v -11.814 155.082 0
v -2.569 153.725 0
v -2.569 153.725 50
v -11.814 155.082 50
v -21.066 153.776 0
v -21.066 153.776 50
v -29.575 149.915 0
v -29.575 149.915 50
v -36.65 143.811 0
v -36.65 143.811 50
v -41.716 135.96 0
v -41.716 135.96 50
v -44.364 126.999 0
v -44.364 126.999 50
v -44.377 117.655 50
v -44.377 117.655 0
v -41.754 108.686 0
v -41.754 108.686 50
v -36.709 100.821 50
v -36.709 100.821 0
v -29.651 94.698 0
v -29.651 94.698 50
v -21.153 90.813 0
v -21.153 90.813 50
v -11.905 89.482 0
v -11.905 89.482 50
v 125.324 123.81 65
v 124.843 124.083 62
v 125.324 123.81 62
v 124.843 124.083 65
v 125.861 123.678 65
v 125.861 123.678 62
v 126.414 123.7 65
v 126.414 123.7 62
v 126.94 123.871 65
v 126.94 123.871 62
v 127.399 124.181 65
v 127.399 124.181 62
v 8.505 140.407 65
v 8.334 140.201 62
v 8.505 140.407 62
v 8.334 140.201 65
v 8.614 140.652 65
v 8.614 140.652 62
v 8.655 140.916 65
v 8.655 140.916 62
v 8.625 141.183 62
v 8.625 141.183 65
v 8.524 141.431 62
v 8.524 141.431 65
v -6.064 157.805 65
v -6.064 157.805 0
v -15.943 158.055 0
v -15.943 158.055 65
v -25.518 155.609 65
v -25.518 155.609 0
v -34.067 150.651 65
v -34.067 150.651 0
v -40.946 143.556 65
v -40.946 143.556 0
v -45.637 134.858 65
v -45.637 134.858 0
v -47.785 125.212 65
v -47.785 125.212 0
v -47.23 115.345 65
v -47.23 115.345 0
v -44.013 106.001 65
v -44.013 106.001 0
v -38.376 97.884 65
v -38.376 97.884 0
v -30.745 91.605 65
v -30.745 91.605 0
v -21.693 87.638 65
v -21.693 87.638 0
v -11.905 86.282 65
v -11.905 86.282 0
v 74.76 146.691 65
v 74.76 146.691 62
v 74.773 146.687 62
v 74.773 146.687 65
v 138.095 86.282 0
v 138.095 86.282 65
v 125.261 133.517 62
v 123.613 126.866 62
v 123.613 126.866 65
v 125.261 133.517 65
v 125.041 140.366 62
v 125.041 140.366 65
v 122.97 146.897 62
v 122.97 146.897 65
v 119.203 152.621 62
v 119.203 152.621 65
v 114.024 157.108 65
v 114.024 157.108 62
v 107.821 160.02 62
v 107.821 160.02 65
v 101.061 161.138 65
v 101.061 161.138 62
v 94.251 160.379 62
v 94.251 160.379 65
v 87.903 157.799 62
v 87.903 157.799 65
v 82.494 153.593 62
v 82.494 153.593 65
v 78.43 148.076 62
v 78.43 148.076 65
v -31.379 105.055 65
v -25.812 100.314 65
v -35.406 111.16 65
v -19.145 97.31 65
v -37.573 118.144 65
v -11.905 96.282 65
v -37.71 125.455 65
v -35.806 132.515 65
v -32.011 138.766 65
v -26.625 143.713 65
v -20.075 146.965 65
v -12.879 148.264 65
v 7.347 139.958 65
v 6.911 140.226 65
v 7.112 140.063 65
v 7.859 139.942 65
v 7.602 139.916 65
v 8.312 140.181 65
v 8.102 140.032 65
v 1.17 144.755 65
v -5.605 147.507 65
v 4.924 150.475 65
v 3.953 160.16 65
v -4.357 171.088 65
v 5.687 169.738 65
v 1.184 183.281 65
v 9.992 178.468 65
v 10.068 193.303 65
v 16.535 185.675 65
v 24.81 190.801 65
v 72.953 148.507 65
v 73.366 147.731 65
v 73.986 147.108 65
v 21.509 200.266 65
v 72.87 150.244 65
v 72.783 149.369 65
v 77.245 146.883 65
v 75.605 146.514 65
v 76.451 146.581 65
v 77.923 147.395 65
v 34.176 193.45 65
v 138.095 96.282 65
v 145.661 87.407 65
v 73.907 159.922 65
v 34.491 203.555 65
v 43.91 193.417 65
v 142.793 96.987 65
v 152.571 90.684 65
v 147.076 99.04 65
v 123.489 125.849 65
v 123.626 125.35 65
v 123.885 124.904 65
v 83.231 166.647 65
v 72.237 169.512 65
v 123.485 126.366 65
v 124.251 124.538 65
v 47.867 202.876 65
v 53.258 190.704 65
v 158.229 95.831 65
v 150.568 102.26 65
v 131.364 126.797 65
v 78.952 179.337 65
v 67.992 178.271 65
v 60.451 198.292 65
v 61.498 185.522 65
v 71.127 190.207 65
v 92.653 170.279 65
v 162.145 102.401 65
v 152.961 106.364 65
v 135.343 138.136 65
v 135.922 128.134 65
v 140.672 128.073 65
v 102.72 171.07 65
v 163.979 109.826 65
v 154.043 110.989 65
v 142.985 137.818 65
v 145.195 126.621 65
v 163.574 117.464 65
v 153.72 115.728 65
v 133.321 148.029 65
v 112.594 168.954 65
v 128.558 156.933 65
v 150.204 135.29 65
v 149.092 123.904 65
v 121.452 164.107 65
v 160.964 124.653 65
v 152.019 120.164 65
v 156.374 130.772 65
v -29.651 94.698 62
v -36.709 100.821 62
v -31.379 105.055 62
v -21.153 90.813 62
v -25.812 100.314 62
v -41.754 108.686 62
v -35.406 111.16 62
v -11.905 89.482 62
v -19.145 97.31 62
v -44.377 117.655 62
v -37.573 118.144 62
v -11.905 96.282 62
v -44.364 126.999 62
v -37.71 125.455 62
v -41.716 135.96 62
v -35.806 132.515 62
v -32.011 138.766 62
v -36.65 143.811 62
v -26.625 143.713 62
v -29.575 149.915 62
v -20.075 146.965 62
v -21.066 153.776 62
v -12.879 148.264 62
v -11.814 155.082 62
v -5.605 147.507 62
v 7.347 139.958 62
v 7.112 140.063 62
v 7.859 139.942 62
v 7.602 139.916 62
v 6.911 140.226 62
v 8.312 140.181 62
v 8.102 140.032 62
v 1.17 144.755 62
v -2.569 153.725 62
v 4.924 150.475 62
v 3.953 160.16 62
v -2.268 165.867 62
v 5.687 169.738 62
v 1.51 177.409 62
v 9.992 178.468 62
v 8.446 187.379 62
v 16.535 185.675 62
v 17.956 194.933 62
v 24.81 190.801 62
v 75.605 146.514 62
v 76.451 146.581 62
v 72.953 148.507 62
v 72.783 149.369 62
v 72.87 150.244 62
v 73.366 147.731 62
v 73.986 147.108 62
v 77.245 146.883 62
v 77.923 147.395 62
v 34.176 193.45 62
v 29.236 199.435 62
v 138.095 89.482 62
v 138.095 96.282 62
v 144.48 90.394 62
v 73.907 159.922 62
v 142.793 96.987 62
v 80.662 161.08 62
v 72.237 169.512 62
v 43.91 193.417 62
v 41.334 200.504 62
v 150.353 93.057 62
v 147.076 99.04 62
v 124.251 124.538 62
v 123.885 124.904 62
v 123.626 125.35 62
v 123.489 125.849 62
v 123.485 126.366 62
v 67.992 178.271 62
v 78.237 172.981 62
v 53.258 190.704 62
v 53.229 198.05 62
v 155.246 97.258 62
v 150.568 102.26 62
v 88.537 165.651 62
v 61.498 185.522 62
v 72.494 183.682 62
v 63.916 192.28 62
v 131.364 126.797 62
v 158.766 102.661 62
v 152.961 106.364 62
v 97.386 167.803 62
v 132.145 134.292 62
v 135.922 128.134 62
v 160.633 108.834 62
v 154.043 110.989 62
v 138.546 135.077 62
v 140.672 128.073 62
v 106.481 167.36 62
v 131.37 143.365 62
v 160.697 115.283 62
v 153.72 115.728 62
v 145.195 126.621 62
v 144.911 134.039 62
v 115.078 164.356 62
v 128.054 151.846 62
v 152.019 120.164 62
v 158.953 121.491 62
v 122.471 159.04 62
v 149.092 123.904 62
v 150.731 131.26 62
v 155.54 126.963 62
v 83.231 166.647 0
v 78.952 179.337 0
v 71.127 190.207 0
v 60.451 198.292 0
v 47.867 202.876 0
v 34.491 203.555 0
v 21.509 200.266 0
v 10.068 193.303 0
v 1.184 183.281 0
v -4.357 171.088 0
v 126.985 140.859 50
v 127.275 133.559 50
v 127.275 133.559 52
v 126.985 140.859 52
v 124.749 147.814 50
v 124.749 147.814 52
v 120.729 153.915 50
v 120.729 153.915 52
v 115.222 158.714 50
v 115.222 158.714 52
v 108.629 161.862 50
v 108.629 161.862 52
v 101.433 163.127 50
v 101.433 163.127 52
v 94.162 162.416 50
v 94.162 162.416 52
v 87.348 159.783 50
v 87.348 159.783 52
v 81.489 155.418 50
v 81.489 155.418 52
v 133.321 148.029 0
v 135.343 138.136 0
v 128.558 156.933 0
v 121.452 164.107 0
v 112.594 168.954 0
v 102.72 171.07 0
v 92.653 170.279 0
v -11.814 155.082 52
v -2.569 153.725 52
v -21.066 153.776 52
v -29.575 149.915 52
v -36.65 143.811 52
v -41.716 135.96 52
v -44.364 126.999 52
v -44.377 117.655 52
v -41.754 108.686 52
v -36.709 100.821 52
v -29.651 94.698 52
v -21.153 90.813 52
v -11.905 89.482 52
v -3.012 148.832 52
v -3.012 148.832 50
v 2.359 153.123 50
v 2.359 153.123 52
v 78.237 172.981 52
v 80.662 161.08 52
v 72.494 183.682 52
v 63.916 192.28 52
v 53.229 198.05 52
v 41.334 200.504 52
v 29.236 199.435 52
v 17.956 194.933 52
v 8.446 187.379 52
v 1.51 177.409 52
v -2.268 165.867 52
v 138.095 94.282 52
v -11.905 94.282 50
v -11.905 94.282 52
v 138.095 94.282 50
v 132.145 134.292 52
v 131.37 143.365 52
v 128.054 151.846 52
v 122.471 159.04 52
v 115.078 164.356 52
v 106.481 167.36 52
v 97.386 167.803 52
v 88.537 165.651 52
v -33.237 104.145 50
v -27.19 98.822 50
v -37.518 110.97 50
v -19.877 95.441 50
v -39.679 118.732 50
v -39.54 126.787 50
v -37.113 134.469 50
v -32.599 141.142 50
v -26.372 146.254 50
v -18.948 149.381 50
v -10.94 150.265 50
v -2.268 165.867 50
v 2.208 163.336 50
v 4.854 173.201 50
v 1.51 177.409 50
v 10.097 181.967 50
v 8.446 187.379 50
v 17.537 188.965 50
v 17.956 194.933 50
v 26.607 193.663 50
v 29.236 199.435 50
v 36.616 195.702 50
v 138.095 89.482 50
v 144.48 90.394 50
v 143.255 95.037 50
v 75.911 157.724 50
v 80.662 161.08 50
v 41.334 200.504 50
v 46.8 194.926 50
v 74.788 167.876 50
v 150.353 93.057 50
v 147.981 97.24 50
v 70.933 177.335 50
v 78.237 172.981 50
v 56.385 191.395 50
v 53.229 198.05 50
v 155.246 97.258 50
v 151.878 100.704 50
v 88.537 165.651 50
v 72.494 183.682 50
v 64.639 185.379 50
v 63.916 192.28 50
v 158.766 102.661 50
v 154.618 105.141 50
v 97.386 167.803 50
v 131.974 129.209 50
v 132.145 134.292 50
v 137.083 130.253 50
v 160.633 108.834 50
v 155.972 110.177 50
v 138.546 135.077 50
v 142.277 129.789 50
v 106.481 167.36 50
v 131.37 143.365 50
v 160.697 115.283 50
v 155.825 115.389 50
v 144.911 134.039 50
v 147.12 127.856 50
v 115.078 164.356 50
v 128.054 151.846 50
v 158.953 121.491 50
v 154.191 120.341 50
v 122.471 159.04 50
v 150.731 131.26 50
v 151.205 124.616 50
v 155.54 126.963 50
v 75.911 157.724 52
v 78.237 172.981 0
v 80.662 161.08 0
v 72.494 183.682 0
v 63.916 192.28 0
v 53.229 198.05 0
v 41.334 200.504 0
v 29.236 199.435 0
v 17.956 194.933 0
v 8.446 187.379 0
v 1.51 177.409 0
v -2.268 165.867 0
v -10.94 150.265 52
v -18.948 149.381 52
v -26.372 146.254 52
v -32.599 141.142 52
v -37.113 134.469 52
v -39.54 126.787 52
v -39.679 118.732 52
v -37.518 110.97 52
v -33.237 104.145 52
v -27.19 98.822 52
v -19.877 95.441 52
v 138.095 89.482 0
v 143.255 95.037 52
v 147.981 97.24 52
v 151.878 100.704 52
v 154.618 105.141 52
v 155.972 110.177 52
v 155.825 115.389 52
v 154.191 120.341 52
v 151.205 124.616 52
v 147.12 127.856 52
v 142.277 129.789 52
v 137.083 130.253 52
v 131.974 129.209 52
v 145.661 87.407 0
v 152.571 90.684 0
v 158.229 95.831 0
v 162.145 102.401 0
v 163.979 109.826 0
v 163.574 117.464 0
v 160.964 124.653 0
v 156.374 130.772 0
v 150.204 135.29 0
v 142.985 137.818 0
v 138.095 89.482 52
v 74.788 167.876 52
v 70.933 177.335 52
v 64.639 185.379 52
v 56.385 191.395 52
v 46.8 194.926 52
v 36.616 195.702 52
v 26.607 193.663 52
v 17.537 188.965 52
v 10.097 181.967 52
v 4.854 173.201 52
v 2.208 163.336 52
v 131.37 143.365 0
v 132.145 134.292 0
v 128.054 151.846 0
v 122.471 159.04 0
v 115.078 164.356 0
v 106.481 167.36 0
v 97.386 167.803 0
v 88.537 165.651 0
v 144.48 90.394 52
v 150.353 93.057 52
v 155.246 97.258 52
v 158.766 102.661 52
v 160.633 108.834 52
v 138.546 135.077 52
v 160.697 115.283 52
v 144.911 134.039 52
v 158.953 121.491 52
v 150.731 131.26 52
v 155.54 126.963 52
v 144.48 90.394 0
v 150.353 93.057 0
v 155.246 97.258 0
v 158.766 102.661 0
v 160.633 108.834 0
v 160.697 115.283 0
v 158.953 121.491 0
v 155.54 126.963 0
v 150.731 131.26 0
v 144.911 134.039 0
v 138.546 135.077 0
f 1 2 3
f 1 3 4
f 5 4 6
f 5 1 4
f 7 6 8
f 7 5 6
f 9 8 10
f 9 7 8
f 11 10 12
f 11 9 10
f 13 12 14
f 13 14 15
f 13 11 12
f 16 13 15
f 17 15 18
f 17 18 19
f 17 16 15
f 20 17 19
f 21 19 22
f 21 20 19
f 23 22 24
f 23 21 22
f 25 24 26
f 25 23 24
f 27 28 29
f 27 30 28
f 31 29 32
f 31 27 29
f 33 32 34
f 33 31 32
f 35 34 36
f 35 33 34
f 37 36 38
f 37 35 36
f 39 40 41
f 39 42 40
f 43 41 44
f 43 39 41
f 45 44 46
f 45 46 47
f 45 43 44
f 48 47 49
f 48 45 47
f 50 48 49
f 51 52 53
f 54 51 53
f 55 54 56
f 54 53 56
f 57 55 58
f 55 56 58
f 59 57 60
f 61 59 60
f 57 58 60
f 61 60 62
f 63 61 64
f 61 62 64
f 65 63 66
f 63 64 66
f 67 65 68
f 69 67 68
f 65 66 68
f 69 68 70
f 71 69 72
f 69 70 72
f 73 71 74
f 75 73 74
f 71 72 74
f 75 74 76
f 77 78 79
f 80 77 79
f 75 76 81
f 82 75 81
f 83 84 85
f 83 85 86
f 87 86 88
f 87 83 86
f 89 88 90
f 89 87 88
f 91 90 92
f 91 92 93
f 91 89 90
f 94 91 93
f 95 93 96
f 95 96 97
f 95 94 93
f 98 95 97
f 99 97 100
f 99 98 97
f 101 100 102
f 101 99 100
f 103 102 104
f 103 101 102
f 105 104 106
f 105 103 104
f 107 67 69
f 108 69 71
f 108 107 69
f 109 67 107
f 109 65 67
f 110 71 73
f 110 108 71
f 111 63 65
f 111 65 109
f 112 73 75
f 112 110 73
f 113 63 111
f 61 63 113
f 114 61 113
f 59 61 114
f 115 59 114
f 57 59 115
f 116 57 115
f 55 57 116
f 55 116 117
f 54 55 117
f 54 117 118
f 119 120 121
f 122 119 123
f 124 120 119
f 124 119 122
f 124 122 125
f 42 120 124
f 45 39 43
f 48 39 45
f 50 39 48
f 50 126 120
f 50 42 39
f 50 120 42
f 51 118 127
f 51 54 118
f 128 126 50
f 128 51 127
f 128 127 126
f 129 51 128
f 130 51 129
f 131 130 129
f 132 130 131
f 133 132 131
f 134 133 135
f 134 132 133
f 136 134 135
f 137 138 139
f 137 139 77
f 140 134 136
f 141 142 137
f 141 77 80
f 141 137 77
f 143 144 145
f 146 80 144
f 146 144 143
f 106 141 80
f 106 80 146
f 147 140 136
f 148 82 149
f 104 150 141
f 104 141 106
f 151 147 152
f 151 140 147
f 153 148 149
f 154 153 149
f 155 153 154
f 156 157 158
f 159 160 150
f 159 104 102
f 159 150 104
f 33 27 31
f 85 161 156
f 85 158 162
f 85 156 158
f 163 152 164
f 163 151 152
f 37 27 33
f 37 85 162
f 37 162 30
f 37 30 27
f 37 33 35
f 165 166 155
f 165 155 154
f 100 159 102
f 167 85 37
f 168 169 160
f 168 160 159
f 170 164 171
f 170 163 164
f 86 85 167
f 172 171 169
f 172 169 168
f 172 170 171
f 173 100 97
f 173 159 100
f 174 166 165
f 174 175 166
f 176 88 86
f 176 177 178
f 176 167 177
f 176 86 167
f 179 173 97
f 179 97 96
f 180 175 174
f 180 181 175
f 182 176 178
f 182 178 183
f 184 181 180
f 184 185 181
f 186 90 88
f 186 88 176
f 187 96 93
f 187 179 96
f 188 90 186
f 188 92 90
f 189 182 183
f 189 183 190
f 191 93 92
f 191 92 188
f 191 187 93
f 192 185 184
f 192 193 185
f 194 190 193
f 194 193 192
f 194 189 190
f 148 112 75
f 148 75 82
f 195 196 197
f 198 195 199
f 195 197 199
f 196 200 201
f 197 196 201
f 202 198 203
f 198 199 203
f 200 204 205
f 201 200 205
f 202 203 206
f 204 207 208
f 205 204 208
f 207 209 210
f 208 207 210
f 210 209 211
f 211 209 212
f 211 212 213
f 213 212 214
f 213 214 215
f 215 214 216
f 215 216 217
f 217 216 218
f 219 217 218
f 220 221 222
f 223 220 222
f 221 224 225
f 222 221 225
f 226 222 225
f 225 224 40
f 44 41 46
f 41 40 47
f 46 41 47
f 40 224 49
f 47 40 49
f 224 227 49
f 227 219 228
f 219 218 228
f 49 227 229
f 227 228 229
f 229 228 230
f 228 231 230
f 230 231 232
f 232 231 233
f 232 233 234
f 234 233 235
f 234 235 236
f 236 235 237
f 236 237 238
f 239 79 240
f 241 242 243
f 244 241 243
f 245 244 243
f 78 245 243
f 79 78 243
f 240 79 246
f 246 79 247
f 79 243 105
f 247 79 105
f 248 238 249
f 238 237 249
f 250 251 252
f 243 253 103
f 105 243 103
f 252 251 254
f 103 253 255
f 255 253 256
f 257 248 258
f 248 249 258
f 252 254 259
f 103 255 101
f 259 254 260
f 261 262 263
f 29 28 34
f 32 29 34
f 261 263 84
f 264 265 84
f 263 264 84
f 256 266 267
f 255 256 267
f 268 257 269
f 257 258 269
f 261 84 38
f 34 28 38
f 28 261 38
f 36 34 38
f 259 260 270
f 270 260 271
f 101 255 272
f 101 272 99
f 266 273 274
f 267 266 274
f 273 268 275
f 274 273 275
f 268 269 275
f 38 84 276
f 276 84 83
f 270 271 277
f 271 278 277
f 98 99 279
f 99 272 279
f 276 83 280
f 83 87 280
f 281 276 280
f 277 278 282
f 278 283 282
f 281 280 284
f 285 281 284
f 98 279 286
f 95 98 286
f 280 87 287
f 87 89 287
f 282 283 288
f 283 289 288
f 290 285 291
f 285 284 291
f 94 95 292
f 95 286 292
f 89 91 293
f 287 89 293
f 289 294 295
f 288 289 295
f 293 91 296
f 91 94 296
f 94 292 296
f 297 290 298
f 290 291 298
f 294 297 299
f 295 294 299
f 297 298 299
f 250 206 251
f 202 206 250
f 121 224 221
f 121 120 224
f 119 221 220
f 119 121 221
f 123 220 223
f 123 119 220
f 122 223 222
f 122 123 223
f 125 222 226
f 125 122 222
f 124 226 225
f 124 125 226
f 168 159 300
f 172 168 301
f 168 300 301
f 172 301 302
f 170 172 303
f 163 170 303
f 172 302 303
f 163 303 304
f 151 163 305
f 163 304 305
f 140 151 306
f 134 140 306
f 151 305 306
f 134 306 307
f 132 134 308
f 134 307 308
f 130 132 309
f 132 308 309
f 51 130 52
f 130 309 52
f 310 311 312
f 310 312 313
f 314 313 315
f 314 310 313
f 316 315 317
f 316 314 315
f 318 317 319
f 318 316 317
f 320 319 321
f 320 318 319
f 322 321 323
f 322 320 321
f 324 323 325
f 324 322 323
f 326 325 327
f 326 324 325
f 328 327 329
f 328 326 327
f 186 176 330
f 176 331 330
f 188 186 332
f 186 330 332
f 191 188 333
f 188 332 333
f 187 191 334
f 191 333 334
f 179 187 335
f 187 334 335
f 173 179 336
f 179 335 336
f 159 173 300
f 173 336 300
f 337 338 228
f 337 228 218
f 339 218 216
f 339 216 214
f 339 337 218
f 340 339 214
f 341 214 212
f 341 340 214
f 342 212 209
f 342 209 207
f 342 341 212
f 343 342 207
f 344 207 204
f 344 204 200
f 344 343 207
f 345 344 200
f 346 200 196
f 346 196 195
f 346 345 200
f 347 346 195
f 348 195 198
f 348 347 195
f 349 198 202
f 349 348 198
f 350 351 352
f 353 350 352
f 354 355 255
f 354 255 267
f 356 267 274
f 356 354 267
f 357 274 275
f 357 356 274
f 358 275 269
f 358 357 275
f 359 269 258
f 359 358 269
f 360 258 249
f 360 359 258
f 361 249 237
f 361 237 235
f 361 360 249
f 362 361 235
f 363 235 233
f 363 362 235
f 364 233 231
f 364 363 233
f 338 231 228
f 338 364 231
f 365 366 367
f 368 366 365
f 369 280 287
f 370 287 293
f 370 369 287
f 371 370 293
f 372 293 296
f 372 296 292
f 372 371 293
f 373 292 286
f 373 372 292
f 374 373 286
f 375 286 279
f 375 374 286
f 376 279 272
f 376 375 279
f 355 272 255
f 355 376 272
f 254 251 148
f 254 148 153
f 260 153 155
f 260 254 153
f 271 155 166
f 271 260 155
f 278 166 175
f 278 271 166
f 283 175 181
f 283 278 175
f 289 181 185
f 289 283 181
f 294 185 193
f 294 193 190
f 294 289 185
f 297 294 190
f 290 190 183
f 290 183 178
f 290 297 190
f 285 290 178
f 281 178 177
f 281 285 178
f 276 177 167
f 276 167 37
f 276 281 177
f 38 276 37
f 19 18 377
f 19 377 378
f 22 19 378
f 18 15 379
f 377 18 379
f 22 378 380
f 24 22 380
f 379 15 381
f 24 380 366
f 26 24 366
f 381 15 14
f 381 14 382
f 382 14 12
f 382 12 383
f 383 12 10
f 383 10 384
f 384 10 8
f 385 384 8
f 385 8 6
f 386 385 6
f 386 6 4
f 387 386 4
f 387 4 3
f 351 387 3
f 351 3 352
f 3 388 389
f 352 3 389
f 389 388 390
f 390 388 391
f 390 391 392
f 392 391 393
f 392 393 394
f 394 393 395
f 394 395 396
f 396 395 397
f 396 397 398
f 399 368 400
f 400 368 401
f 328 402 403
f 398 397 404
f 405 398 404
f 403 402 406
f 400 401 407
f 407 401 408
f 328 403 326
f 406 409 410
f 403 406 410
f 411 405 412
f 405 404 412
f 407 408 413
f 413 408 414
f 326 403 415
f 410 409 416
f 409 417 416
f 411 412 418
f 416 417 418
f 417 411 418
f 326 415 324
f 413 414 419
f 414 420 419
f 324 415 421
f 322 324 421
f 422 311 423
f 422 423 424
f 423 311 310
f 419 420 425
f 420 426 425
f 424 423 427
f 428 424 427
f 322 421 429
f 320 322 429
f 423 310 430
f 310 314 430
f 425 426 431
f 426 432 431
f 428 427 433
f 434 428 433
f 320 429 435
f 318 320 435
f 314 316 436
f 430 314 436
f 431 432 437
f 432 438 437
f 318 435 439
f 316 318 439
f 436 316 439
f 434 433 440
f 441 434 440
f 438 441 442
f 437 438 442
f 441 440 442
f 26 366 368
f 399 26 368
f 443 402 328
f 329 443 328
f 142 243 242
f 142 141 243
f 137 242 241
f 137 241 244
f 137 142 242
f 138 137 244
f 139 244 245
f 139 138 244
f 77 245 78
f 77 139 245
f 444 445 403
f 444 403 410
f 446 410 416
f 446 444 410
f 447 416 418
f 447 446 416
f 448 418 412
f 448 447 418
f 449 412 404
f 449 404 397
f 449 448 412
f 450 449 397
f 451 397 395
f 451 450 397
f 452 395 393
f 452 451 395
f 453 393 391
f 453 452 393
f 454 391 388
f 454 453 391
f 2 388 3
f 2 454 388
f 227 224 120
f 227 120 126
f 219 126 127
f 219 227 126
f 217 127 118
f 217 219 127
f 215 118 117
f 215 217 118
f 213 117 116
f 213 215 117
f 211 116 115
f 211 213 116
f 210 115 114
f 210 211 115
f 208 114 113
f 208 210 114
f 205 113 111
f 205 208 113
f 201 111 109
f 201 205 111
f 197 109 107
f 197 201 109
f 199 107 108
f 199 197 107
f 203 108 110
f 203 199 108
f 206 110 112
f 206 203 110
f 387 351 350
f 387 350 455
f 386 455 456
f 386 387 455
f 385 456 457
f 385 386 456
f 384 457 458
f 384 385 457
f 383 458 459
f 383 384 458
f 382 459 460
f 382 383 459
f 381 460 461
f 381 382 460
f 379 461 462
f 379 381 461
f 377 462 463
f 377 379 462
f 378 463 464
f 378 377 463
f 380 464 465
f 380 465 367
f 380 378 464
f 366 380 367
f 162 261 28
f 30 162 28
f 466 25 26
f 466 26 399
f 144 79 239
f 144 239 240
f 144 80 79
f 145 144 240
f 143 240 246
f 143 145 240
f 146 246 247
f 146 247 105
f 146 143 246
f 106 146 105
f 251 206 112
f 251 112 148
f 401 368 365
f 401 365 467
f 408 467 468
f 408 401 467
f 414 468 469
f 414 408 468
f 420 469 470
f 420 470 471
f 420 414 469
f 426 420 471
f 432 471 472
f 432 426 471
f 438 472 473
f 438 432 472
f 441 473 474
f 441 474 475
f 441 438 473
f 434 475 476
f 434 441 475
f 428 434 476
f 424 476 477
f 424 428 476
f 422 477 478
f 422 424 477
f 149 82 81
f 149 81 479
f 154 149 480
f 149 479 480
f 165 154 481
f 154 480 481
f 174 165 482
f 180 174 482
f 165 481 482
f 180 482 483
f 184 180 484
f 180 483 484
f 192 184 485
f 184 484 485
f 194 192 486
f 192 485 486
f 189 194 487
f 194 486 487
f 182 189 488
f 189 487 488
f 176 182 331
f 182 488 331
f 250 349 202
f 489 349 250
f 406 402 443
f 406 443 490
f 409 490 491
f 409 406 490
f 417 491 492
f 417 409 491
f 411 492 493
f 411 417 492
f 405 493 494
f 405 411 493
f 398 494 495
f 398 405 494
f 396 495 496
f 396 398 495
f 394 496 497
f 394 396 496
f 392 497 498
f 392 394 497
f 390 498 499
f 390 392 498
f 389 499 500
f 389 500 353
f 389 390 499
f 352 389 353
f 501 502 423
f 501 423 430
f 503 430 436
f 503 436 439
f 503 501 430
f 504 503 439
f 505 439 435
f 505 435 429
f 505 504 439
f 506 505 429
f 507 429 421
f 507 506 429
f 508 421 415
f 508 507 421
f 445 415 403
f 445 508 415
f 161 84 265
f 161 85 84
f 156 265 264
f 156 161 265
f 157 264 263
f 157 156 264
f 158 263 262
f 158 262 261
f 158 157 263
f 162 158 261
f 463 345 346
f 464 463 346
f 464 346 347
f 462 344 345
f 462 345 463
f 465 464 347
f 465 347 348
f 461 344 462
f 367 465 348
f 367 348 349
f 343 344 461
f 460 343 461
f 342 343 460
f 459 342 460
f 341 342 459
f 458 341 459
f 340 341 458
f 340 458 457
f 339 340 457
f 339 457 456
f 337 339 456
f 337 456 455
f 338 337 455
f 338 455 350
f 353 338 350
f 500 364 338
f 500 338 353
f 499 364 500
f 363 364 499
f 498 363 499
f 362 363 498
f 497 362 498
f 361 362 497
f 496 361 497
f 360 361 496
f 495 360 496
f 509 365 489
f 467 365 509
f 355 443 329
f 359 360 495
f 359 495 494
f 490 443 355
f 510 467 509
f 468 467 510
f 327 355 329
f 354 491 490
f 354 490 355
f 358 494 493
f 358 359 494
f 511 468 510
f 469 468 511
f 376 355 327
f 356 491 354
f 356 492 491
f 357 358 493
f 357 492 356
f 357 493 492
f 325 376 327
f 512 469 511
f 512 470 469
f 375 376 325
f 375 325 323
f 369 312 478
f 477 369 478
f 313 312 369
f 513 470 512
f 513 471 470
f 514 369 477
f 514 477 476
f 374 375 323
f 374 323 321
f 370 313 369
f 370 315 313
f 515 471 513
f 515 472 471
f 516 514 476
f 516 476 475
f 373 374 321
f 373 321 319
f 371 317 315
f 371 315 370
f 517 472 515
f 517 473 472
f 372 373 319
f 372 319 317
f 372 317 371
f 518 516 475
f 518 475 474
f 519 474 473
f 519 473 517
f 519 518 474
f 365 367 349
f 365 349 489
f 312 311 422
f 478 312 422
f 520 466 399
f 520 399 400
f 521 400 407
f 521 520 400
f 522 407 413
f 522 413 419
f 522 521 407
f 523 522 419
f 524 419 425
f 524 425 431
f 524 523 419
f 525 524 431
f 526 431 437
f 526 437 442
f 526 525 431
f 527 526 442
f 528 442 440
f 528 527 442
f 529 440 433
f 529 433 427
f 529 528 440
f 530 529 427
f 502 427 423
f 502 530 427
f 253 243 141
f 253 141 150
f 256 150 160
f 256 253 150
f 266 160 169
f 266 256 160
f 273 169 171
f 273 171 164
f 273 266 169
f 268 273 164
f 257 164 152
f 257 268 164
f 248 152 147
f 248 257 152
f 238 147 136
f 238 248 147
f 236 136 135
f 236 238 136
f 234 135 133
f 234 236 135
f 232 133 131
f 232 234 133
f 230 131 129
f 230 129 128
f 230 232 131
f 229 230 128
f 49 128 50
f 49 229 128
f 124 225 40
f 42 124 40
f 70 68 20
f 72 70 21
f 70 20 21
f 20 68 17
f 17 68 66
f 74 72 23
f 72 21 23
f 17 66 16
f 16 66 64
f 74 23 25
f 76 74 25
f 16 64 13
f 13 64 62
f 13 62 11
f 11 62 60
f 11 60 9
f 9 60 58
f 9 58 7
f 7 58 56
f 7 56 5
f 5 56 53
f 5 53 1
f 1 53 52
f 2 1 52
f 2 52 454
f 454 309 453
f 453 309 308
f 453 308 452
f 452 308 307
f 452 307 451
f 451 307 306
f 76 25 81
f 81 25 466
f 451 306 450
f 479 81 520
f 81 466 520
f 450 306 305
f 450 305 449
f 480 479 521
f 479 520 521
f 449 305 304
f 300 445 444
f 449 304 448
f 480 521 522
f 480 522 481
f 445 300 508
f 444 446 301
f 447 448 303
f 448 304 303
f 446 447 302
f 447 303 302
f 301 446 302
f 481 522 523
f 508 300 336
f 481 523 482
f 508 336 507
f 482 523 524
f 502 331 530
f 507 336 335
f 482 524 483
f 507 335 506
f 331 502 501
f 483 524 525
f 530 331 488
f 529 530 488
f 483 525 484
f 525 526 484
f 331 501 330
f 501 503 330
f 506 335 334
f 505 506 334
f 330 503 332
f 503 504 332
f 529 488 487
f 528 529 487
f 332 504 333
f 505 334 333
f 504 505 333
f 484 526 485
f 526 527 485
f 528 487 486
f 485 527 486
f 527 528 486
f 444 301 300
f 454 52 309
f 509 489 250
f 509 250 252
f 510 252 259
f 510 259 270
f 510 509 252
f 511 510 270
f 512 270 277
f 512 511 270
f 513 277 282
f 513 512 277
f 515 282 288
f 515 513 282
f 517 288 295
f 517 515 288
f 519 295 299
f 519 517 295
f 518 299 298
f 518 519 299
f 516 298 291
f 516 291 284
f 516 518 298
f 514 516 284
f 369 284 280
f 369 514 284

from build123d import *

# Parameters (mm, degrees)
PAD016_DEPTH = 50
PAD017_DEPTH = 2
PAD018_DEPTH = 10
PAD019_DEPTH = 3
FILLET_R     = 1
FILLET001_R  = 3
FILLET002_R  = 2


with BuildPart() as part:
    # Sketch024 → Pad016 (new body)
    with BuildSketch(Plane.XY):
        with BuildLine():
            Line((0, 0), (150, 0))
            ThreePointArc((150, 0), (175.963449, 27.378164), (147.247546, 51.853897))
            ThreePointArc((147.247546, 51.853897), (129.103193, 80.569725), (95.135939, 80.364888))
            ThreePointArc((95.135939, 80.364888), (46.395903, 117.272917), (5.84043, 71.523082))
            ThreePointArc((5.84043, 71.523082), (-35.880572, 38.929935), (0, 0))
        make_face()
        with BuildLine():
            ThreePointArc((92.566341, 74.797944), (47.150665, 114.129661), (9.33601, 67.443265))
            ThreePointArc((9.33601, 67.443265), (-32.459044, 40.717039), (0, 3.2))
            Line((0, 3.2), (150, 3.2))
            ThreePointArc((150, 3.2), (172.60162, 29.001128), (144.049968, 48.009932))
            ThreePointArc((144.049968, 48.009932), (126.982256, 78.074612), (92.566341, 74.797944))
        make_face(mode=Mode.SUBTRACT)
    extrude(amount=PAD016_DEPTH)

    # Sketch025 (on Face12 of Pad016) → Pad017 (join)
    with BuildSketch(Plane.XY.offset(50)):
        with BuildLine():
            Line((0, 0), (150, 0))
            ThreePointArc((150, 0), (175.963449, 27.378164), (147.247546, 51.853897))
            ThreePointArc((147.247546, 51.853897), (129.103193, 80.569725), (95.135939, 80.364888))
            ThreePointArc((95.135939, 80.364888), (46.395903, 117.272917), (5.84043, 71.523082))
            ThreePointArc((5.84043, 71.523082), (-35.880572, 38.929935), (0, 0))
        make_face()
        with BuildLine():
            ThreePointArc((87.815114, 71.442447), (48.520032, 109.41973), (14.263984, 66.841559))
            Line((8.892558, 62.550375), (14.263984, 66.841559))
            ThreePointArc((8.892558, 62.550375), (-27.635218, 40.504969), (0, 8))
            Line((0, 8), (150, 8))
            ThreePointArc((150, 8), (167.729763, 29.107329), (143.878644, 42.927168))
            Line((139.179868, 47.277594), (143.878644, 42.927168))
            ThreePointArc((139.179868, 47.277594), (123.936648, 74.230459), (93.393809, 69.136577))
            Line((87.815114, 71.442447), (93.393809, 69.136577))
        make_face(mode=Mode.SUBTRACT)
    extrude(amount=PAD017_DEPTH)

    # Sketch026 (on Face15 of Pad017) → Pad018 (join)
    with BuildSketch(Plane.XY.offset(52)):
        with BuildLine():
            Line((0, 0), (150, 0))
            ThreePointArc((150, 0), (175.963449, 27.378164), (147.247546, 51.853897))
            ThreePointArc((147.247546, 51.853897), (129.103193, 80.569725), (95.135939, 80.364888))
            ThreePointArc((95.135939, 80.364888), (46.395903, 117.272917), (5.84043, 71.523082))
            ThreePointArc((5.84043, 71.523082), (-35.880572, 38.929935), (0, 0))
        make_face()
        with BuildLine():
            ThreePointArc((92.566341, 74.797944), (47.150665, 114.129661), (9.33601, 67.443265))
            ThreePointArc((9.33601, 67.443265), (-32.459044, 40.717039), (0, 3.2))
            Line((0, 3.2), (150, 3.2))
            ThreePointArc((150, 3.2), (172.60162, 29.001128), (144.049968, 48.009932))
            ThreePointArc((144.049968, 48.009932), (126.982256, 78.074612), (92.566341, 74.797944))
        make_face(mode=Mode.SUBTRACT)
    extrude(amount=PAD018_DEPTH)

    # Sketch027 (on Face21 of Pad018) → Pad019 (join)
    with BuildSketch(Plane.XY.offset(62)):
        with BuildLine():
            Line((0, 0), (150, 0))
            ThreePointArc((150, 0), (175.963449, 27.378164), (147.247546, 51.853897))
            ThreePointArc((147.247546, 51.853897), (129.103193, 80.569725), (95.135939, 80.364888))
            ThreePointArc((95.135939, 80.364888), (46.395903, 117.272917), (5.84043, 71.523082))
            ThreePointArc((5.84043, 71.523082), (-35.880572, 38.929935), (0, 0))
        make_face()
        with BuildLine():
            ThreePointArc((84.015068, 61.367554), (47.028893, 107.28489), (20.829728, 54.464603))
            Line((19.480393, 53.219591), (20.829728, 54.464603))
            ThreePointArc((19.480393, 53.219591), (-23.703474, 46.683881), (0, 10))
            Line((0, 10), (150, 10))
            ThreePointArc((150, 10), (164.62434, 32.490661), (138.134796, 36.733915))
            Line((134.91887, 39.207776), (138.134796, 36.733915))
            ThreePointArc((134.91887, 39.207776), (122.444141, 72.716079), (89.228181, 59.48259))
            Line((84.015068, 61.367554), (89.228181, 59.48259))
        make_face(mode=Mode.SUBTRACT)
    extrude(amount=PAD019_DEPTH)

    # Fillet
    fillet_edges = [part.edges().sort_by_distance(p)[0] for p in [
        (20.829728, 54.464603, 63.5),
        (19.480393, 53.219591, 63.5),
    ]]
    fillet(fillet_edges, radius=FILLET_R)

    # Fillet001
    fillet001_edges = [part.edges().sort_by_distance(p)[0] for p in [
        (89.228181, 59.48259, 63.5),
        (84.015068, 61.367554, 63.5),
    ]]
    fillet(fillet001_edges, radius=FILLET001_R)

    # Fillet002
    fillet002_edges = [part.edges().sort_by_distance(p)[0] for p in [
        (138.134796, 36.733915, 63.5),
        (134.91887, 39.207776, 63.5),
    ]]
    fillet(fillet002_edges, radius=FILLET002_R)


with BuildPart() as part_1:
    # Body004 placement: moved
    add(part.part.moved(Location((-11.904526, 86.281793, 0))))


solid = part_1.part
